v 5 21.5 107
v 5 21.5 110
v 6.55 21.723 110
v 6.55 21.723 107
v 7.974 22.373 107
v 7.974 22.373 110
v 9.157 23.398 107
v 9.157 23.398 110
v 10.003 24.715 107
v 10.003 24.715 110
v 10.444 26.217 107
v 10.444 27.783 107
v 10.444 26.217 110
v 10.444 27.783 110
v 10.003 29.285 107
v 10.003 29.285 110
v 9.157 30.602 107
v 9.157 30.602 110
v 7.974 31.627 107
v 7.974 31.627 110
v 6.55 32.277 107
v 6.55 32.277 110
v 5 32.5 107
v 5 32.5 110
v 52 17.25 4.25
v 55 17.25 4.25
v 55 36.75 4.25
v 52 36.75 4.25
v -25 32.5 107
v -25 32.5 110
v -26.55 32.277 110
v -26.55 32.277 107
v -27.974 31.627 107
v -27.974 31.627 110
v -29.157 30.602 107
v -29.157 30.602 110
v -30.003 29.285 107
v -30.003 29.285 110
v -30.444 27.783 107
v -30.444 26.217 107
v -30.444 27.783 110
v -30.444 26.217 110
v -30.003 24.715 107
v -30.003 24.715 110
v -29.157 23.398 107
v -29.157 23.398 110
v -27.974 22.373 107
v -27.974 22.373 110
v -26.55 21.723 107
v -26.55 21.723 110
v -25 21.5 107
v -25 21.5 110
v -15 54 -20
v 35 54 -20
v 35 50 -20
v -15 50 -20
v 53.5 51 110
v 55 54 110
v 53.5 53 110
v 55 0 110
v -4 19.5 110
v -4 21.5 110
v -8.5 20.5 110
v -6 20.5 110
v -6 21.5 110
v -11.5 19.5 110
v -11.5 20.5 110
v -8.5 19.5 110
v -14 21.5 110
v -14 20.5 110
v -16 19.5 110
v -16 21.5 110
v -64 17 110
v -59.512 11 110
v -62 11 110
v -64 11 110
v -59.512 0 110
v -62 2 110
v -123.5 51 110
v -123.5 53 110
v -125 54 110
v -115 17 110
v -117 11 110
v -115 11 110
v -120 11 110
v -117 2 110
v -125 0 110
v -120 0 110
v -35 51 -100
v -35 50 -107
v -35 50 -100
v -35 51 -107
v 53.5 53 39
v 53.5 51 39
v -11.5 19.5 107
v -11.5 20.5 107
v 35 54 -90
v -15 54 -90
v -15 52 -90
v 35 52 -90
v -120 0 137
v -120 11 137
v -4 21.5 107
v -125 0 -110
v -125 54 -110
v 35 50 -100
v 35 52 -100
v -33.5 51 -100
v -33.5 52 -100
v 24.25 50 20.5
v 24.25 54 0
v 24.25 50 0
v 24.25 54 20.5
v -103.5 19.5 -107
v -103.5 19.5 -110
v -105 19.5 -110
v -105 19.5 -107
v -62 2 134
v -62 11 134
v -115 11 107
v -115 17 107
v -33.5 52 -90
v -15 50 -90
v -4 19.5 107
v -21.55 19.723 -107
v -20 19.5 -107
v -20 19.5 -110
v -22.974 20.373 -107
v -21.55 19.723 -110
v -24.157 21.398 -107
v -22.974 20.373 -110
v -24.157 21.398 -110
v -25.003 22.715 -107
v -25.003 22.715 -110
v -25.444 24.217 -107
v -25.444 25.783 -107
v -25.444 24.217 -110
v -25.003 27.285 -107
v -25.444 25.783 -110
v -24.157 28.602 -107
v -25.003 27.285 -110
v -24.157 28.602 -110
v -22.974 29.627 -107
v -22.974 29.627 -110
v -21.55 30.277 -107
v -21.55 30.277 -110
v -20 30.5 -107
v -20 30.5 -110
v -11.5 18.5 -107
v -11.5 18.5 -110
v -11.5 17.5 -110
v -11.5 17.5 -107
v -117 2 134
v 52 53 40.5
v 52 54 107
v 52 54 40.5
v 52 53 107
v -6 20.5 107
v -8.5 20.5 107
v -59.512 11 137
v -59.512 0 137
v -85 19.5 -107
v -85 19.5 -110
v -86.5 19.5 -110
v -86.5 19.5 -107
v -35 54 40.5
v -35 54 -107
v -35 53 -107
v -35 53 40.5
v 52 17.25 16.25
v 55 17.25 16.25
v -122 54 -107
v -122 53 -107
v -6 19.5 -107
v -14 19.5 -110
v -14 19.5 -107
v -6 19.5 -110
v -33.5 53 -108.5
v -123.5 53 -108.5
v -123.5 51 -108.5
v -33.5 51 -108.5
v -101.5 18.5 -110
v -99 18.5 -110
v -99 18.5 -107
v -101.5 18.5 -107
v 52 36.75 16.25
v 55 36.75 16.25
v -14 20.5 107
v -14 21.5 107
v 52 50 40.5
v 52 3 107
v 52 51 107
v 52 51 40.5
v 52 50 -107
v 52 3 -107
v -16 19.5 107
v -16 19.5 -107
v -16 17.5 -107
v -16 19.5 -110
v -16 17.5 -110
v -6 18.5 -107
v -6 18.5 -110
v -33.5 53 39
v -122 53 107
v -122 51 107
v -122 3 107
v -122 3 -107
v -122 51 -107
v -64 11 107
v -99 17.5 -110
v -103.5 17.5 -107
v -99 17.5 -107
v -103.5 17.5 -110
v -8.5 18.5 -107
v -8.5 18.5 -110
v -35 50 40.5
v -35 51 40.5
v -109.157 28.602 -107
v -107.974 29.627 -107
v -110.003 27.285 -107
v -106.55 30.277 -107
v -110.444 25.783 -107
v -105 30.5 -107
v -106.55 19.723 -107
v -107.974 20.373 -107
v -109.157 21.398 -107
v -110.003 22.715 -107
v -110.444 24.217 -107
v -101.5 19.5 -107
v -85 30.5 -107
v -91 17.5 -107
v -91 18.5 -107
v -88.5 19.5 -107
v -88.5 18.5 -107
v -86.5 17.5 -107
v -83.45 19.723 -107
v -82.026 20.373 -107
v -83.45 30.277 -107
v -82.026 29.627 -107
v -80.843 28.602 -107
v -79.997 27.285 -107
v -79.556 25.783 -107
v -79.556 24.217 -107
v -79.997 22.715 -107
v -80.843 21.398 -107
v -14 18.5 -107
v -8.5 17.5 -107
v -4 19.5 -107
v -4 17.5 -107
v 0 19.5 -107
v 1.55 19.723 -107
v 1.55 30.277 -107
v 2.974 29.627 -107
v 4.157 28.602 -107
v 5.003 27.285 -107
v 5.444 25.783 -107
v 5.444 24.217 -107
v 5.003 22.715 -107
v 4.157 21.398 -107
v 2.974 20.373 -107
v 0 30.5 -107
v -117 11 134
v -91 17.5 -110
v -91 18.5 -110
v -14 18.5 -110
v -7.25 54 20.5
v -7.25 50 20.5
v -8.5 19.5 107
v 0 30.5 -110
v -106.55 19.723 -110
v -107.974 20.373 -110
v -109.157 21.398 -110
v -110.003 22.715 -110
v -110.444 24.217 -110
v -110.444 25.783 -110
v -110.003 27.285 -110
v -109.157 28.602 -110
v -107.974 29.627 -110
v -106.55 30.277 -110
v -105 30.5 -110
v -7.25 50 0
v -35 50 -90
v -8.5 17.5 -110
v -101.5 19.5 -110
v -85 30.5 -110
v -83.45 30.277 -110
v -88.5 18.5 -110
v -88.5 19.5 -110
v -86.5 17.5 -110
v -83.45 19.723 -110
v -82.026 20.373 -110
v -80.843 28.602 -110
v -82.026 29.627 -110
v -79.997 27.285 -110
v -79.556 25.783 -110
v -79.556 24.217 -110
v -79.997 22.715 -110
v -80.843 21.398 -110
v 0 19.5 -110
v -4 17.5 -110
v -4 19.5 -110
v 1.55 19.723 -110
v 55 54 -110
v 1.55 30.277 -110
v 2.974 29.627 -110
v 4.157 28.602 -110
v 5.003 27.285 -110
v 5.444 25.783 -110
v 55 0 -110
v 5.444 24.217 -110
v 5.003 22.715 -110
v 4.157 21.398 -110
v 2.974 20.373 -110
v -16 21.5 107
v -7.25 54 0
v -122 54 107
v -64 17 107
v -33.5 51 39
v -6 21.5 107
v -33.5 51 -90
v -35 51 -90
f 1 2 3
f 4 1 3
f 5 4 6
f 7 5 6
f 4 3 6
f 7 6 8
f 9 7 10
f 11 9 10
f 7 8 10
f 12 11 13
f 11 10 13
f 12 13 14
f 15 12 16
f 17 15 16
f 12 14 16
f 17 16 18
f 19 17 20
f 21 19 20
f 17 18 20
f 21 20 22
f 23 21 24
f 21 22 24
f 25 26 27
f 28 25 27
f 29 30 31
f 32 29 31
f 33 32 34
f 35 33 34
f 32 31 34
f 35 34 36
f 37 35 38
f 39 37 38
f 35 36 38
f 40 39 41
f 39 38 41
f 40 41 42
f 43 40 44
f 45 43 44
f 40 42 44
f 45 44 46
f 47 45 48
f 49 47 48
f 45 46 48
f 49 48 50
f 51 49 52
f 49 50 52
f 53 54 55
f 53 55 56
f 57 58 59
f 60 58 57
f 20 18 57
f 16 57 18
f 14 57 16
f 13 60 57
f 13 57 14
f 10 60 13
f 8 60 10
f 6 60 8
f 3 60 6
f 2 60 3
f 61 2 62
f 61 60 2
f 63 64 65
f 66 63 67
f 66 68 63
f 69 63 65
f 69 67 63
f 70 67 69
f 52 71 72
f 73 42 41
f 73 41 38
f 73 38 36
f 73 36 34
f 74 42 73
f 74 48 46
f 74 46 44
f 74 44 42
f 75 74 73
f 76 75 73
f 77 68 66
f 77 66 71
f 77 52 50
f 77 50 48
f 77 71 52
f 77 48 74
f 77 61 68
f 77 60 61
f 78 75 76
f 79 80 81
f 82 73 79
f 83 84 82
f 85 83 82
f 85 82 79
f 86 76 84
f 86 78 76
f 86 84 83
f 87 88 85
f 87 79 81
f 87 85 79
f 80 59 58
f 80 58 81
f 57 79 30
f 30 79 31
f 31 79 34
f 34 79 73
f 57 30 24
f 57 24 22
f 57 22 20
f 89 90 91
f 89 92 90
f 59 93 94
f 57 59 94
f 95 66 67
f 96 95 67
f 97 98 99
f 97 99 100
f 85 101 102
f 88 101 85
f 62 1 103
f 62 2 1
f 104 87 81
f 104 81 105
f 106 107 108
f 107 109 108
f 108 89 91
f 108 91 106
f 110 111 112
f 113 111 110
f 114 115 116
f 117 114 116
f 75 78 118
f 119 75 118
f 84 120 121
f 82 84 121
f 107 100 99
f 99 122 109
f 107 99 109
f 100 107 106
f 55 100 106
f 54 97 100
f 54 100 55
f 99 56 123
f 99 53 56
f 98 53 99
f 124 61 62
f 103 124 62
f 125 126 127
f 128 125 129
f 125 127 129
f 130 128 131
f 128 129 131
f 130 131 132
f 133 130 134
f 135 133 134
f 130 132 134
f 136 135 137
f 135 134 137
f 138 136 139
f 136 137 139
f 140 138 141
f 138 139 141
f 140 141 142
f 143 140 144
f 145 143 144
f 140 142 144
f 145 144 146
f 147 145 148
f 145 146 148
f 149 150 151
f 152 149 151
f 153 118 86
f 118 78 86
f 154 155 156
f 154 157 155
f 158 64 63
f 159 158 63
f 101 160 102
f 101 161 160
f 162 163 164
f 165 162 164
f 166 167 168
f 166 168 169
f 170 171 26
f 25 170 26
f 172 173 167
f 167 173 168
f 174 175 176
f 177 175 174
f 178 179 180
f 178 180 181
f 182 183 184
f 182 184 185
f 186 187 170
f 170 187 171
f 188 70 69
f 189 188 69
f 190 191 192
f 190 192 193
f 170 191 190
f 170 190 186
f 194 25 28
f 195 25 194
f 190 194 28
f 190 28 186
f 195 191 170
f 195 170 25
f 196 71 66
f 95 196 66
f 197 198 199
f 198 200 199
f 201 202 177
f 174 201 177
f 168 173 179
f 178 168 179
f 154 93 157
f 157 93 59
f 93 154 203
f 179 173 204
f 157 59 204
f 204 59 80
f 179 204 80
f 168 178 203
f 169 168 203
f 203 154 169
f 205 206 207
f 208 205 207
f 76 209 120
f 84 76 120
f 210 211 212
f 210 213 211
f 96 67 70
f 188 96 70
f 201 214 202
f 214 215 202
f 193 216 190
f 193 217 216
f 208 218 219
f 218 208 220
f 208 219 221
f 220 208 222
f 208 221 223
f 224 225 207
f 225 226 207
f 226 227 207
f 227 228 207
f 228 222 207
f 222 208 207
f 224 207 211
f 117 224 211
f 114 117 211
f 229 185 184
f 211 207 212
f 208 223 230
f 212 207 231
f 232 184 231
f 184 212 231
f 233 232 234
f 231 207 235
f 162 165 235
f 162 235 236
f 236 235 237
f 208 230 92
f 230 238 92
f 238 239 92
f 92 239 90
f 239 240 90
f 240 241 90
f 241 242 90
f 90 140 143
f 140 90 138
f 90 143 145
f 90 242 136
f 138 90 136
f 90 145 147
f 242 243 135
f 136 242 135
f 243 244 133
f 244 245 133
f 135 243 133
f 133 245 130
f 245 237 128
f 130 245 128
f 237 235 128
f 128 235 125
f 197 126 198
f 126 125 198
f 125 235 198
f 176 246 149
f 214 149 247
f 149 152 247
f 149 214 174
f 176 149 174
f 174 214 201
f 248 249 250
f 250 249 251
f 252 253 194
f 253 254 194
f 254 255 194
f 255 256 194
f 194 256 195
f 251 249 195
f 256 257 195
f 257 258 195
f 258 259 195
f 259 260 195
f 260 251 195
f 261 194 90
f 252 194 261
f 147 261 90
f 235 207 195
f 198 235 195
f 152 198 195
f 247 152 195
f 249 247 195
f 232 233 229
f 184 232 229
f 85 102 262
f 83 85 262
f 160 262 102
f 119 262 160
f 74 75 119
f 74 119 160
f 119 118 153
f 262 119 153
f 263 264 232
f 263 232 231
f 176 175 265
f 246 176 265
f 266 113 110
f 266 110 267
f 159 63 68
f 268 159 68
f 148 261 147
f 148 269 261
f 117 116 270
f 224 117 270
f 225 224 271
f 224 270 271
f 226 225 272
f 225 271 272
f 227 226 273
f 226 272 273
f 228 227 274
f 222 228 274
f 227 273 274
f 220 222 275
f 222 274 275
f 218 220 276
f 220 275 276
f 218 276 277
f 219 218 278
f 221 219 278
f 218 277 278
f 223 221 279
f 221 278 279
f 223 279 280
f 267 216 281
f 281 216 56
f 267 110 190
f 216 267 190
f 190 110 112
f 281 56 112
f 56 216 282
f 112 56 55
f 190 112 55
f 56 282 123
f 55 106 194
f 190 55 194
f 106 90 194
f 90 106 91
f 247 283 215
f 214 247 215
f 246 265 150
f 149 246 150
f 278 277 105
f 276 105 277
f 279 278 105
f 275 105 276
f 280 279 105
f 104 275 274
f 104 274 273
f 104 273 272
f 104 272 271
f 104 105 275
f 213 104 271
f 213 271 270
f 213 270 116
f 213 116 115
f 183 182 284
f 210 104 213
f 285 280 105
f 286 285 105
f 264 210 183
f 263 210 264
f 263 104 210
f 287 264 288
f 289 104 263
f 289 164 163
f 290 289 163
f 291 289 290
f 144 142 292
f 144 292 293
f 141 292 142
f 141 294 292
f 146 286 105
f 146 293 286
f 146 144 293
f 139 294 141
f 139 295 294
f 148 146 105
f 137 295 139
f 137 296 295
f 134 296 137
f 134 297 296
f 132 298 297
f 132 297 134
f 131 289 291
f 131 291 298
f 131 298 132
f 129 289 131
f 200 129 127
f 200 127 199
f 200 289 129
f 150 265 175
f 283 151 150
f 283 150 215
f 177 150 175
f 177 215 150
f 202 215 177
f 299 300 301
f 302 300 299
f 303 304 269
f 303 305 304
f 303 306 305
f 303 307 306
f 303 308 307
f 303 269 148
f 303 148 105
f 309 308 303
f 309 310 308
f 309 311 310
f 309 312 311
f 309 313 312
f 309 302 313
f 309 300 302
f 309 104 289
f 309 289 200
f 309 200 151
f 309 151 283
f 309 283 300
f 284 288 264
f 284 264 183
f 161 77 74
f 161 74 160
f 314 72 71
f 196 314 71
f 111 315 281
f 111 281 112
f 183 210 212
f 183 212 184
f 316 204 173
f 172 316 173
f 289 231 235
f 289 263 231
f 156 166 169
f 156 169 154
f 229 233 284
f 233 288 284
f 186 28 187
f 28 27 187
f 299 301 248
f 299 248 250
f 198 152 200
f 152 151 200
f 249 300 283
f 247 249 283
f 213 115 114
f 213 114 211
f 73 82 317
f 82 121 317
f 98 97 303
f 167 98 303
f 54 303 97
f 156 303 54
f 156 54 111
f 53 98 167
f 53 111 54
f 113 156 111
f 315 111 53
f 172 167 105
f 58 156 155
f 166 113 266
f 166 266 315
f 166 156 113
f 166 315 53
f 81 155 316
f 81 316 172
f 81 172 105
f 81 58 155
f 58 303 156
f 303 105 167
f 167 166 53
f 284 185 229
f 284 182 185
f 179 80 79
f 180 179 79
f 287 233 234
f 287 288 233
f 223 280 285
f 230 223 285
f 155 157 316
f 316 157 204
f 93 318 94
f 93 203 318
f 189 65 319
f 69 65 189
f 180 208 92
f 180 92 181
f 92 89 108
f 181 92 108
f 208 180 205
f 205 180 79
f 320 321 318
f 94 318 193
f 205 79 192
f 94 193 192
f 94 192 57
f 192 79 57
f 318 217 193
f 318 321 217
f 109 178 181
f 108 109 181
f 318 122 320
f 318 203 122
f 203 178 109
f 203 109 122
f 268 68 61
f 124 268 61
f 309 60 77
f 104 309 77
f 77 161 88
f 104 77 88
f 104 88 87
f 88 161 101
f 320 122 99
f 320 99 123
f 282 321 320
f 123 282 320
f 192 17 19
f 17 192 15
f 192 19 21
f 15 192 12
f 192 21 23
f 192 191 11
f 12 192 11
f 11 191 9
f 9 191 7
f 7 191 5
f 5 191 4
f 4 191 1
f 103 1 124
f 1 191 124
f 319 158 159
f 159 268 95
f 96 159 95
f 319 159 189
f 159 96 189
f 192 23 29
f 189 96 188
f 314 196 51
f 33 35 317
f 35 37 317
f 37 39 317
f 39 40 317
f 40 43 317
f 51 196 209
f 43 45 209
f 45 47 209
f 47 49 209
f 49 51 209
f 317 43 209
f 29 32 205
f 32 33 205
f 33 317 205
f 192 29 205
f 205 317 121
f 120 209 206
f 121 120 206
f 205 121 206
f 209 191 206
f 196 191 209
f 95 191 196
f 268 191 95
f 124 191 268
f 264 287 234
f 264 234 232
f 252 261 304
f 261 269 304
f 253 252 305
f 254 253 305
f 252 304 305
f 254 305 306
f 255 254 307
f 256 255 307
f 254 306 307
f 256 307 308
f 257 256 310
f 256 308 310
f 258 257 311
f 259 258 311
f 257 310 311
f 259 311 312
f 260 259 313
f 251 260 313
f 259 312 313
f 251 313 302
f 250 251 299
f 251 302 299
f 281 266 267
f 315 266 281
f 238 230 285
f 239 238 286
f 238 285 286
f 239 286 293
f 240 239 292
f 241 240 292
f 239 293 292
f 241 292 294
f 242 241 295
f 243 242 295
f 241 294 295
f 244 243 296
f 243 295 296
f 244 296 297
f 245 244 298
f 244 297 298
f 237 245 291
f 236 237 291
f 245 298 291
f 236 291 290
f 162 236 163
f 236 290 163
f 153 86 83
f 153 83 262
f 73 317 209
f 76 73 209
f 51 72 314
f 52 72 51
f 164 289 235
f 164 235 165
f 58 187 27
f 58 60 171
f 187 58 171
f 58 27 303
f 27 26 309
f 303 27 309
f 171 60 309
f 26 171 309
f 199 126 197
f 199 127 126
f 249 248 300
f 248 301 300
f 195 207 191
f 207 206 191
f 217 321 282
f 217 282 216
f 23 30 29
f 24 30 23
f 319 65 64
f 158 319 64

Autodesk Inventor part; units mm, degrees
sketch "Sketch1" plane through (0, 0, 0) normal (0, 1, 0) x (-1, 0, 0)
  line L0 (-122, 107) -> (122, 107)
  line L1 (122, 107) -> (122, -107)
  line L2 (122, -107) -> (-122, -107)
  line L3 (-122, -107) -> (-122, 107)
  line L4 (-122, 107) -> (122, -107) construction
  line L5 (122, 107) -> (-122, -107) construction
  line L6 (-125, 110) -> (125, 110)
  line L7 (125, 110) -> (125, -110)
  line L8 (125, -110) -> (-125, -110)
  line L9 (-125, -110) -> (-125, 110)
  line L10 (-125, 110) -> (125, -110) construction
  line L11 (125, 110) -> (-125, -110) construction
  line L12 (122, 107) -> (-52, 107)
  line L13 (-52, 107) -> (-52, -107)
  line L14 (125, 110) -> (-55, 110)
  line L15 (-55, 110) -> (-55, -110)
  point P0 (0, 0)
  dimension "d0" = 244
  dimension "d1" = 214
  dimension "d2" = 250
  dimension "d3" = 220
  dimension "d111" = 174
  dimension "d112" = 180
extrude "Extrusion1" add sketch "Sketch1" along normal blind 54 contours L0 L15 L6 L7 L8 L2 L1 | L13 L2 L15 L0
sketch "Sketch2" plane through (0, 0, 0) normal (0, -1, 0) x (1, 0, 0)
  line L0 (123.5, 110) -> (-123.5, 110)
  line L1 (-123.5, 110) -> (-123.5, -110)
  line L2 (-123.5, -110) -> (123.5, -110)
  line L3 (123.5, -110) -> (123.5, 110)
  line L4 (123.5, 110) -> (-123.5, -110) construction
  line L5 (-123.5, 110) -> (123.5, -110) construction
  line L6 (55, 110) -> (55, -110) projected
  line L7 (55, 110) -> (55, -110)
  point P0 (0, 0)
  dimension "d6" = 247
  dimension "d7" = 220
extrude "Extrusion2" add sketch "Sketch2" against normal blind 3 contours L6 L2 L1 L0
sketch "Sketch3" plane through (-125, 0, 110) normal (0, 0, 1) x (1, 0, 0)
  line L0 (0, 0) -> (0, 54) projected
  line L1 (0, 27) -> (100, 27)
  circle A0 centre (100, 27) radius 8
  circle A1 centre (100, 27) radius 5.5
  line L2 (100, 35) -> (115, 35)
  line L3 (115, 35) -> (115, 19)
  line L4 (115, 19) -> (100, 19)
  line L5 (100, 19) -> (100, 35)
  line L6 (100, 32.5) -> (115, 32.5)
  line L7 (115, 32.5) -> (115, 21.5)
  line L8 (115, 21.5) -> (100, 21.5)
  line L9 (100, 21.5) -> (100, 32.5)
  line L10 (100, 32.5) -> (109, 32.5)
  line L11 (109, 32.5) -> (109, 34.5)
  line L12 (109, 34.5) -> (113.5, 34.5)
  line L13 (113.5, 34.5) -> (113.5, 33.5)
  line L14 (113.5, 33.5) -> (111, 33.5)
  line L15 (111, 33.5) -> (111, 32.5)
  line L16 (100, 27) -> (115, 27)
  line L17 (109, 21.5) -> (109, 19.5)
  line L18 (109, 19.5) -> (113.5, 19.5)
  line L19 (113.5, 19.5) -> (113.5, 20.5)
  line L20 (113.5, 20.5) -> (111, 20.5)
  line L21 (111, 20.5) -> (111, 21.5)
  point P0 (125, 0)
  dimension "d10" = 100
  dimension "d11" = 16
  dimension "d12" = 11
  dimension "d13" = 15
  dimension "d14" = 9
  dimension "d15" = 2
  dimension "d16" = 4.5
  dimension "d17" = 2.5
extrude "Extrusion3" cut sketch "Sketch3" against normal blind 38 contours A1 L5 L1 | L1 L5 A1 | L16 A1 L5 | L5 A1 L16 | L6 A0 L16 A1 | A1 L16 A0 L8 | L6 L3 L16 A0 | A0 L16 L3 L8 | L8 L21 L20 L19 L18 L17
ref_plane "Work Plane2" through (-10, 21.5, 110) normal (-1, 0, 0) x (0, 0, 1)
mirror "Mirror1" about plane through (-10, 21.5, 110) normal (-1, 0, 0) of "Extrusion3"
sketch "Sketch5" plane through (125, 0, -110) normal (0, 0, -1) x (-1, 0, 0)
  line L0 (250, 6) -> (250, 25)
  line L1 (250, 25) -> (230, 25)
  circle A0 centre (230, 25) radius 8
  circle A1 centre (230, 25) radius 5.5
  line L2 (230, 33) -> (220, 33)
  line L3 (220, 33) -> (220, 17)
  line L4 (220, 17) -> (230, 17)
  line L5 (230, 17) -> (230, 33)
  line L6 (230, 30.5) -> (220, 30.5)
  line L7 (220, 30.5) -> (220, 19.5)
  line L8 (220, 19.5) -> (230, 19.5)
  line L9 (230, 19.5) -> (230, 30.5)
  line L10 (230, 30.5) -> (228.5, 30.5)
  line L11 (228.5, 30.5) -> (228.5, 32.5)
  line L12 (228.5, 32.5) -> (224, 32.5)
  line L13 (224, 32.5) -> (224, 31.5)
  line L14 (224, 31.5) -> (226.5, 31.5)
  line L15 (226.5, 31.5) -> (226.5, 30.5)
  line L16 (230, 25) -> (230, 0)
  line L17 (70, 0) -> (250, 0) projected
  line L18 (250, 0) -> (230, 0)
  line L19 (250, 0) -> (230, 0)
  line L20 (228.5, 19.5) -> (228.5, 17.5)
  line L21 (228.5, 17.5) -> (224, 17.5)
  line L22 (224, 17.5) -> (224, 18.5)
  line L23 (224, 18.5) -> (226.5, 18.5)
  line L24 (226.5, 18.5) -> (226.5, 19.5)
  point P0 (125, 0)
  point P1 (121.8464, -1.1281)
  point P2 (220.8464, 22.8719)
  point P3 (228.3464, 12.8719)
  point P4 (227.2161, 32.5)
  point P5 (225.3363, 31.5)
  point P6 (0, 0)
  point P7 (1.5, 0)
  dimension "d36" = 20
  dimension "d37" = 16
  dimension "d38" = 11
  dimension "d39" = 10
  dimension "d40" = 1.5
  dimension "d41" = 2
  dimension "d42" = 4.5
  dimension "d43" = 2.5
  dimension "d44" = 1
  dimension "d45" = 1
  dimension "d63" = 25
  dimension "d103" = 19
  dimension "d106" = 20
extrude "Extrusion5" cut sketch "Sketch5" against normal blind 10 contours A1 L5 L1 | L1 L5 A1 | L5 A1 | A1 L8 A0 L6 | L21 L22 L23 A0 | A0 L23 L24 L8 L20 L21 | L6 A0 L8 L3
ref_plane "Work Plane4" through (-95, 19.5, -110) normal (-1, 0, 0) x (0, 0, 1)
mirror "Mirror3" about plane through (-95, 19.5, -110) normal (-1, 0, 0) of "Extrusion5"
sketch "Sketch6" plane through (125, 0, -110) normal (0, 0, -1) x (-1, 0, 0)
  circle A0 centre (125, 25) radius 8
  circle A1 centre (125, 25) radius 5.5
  line L0 (125, 33) -> (135, 33)
  line L1 (135, 33) -> (135, 17)
  line L2 (135, 17) -> (125, 17)
  line L3 (125, 30.5) -> (135, 30.5)
  line L4 (135, 19.5) -> (125, 19.5)
  line L5 (125, 30.5) -> (129, 30.5)
  line L6 (129, 30.5) -> (129, 32.5)
  line L7 (129, 32.5) -> (133.5, 32.5)
  line L8 (133.5, 25) -> (133.5, 24.983)
  line L9 (133.5, 31.5) -> (131, 31.5)
  line L10 (131, 31.5) -> (131, 30.5)
  line L11 (116.2614, 18.9998) -> (135.2614, 18.9998) construction
  line L12 (133.5, 32.5) -> (133.5, 31.5)
  line L13 (250, 0) -> (250, 54) projected
  line L14 (250, 0) -> (125, 0)
  line L15 (70, 0) -> (250, 0) projected
  line L16 (125, 25) -> (125, 0)
  line L17 (125, 33) -> (125, 25)
  line L18 (125, 30.5) -> (125, 33)
  line L19 (131, 30.5) -> (131, 31.5)
  line L20 (135, 33) -> (135, 17)
  line L21 (125, 17) -> (135, 17)
  line L22 (125, 25) -> (135, 25)
  line L23 (129, 19.5) -> (129, 17.5)
  line L24 (129, 17.5) -> (133.5, 17.5)
  line L25 (133.5, 18.5) -> (131, 18.5)
  line L26 (131, 18.5) -> (131, 19.5)
  line L27 (133.5, 17.5) -> (133.5, 18.5)
  point P0 (125, 0)
  point P1 (219.2081, 3.6104)
  point P2 (112.7081, 17.6104)
  point P3 (127.7081, 27.6104)
  point P4 (0, 0)
  point P5 (1.5, 0)
  dimension "d50" = 16
  dimension "d51" = 11
  dimension "d54" = 2
  dimension "d55" = 4.5
  dimension "d56" = 2.5
  dimension "d57" = 1.5
  dimension "d104" = 25
  dimension "d105" = 125
extrude "Extrusion6" cut sketch "Sketch6" against normal blind 10 contours L3 A0 L22 A1 | L17 L16 A1 | A1 L22 L17 | L23 L4 A0 | A0 L4 L26 L25 L27 L24 L23 | L16 L22 A1 | A1 L22 A0 L4 | L3 L1 L22 A0 | A0 L22 L1 L4
ref_plane "Work Plane5" through (-10, 19.5, -110) normal (1, 0, 0) x (0, 0, -1)
mirror "Mirror4" about plane through (-10, 19.5, -110) normal (1, 0, 0) of "Extrusion6"
sketch "Sketch7" plane through (122, 50, 107) normal (0, 0, -1) x (-1, 0, 0)
  line L0 (70, -47) -> (244, -47) projected
  line L1 (75.0855, -47) -> (75.0855, -50)
  line L2 (75.0855, -50) -> (75.0855, -47)
  line L3 (0, -47) -> (184, -47)
  line L4 (184, -47) -> (184, -39)
  line L5 (184, -39) -> (239, -39)
  line L6 (239, -39) -> (239, -47)
  line L7 (184, -39) -> (194, -39)
  line L8 (239, -39) -> (229, -39)
  line L9 (194, -34.8824) -> (194, -33)
  line L10 (194, -33) -> (229, -33)
  line L11 (229, -33) -> (229, -34.8824)
  line L12 (244, -47) -> (244, 4) projected
  line L13 (184, -47) -> (211.5, -47)
  line L14 (211.5, -47) -> (211.5, -39)
  line L15 (237, -39) -> (237, -33)
  line L16 (237, -33) -> (186, -33)
  line L17 (186, -33) -> (186, -39)
  line L18 (186, -45) -> (237, -33) construction
  line L19 (237, -45) -> (186, -33) construction
  line L20 (186, -39) -> (237, -39)
  point P0 (122, -50)
  point P1 (244, 4)
  point P2 (239, -43)
  point P3 (2, -35)
  point P4 (245, -35)
  point P5 (247, -38)
  point P6 (186, -39)
  point P7 (237, -39)
  dimension "d65" = 8
  dimension "d66" = 55
  dimension "d67" = 10
  dimension "d68" = 10
  dimension "d69" = 6
  dimension "d89" = 5
  dimension "d90" = 51
extrude "Extrusion7" cut sketch "Sketch7" against normal blind 10 contours L5 L17 L16 L10 L15
sketch "Sketch17" plane through (-125, 0, 110) normal (0, 0, 1) x (1, 0, 0)
  line L0 (10, 11) -> (61, 11) projected
  line L1 (35.5, 11) -> (35.5, 0)
  line L2 (177, 3) -> (3, 3) projected
  line L3 (35.5, -2) -> (63, -2)
  line L4 (63, -2) -> (63, 2)
  line L5 (63, 2) -> (8, 2)
  line L6 (8, 2) -> (8, -2)
  line L7 (8, -2) -> (63, 2) construction
  line L8 (63, -2) -> (8, 2) construction
  line L9 (180, 0) -> (0, 0) projected
  line L10 (8, 0) -> (63, 0)
  point P0 (125, 0)
  point P1 (247, 3)
  point P2 (250, 0)
  point P3 (248.5, 0)
  dimension "d91" = 55
  dimension "d92" = 4
extrude "Extrusion11" add sketch "Sketch17" along normal blind 24
sketch "Sketch18" plane through (-117, 2, 110) normal (0, 1, 0) x (1, 0, 0)
  line L0 (0, 0) -> (0, -24) projected
  line L1 (0, 0) -> (55, 0)
  line L2 (55, 0) -> (55, -24)
  line L3 (55, -24) -> (0, -24)
  line L4 (0, -24) -> (0, 0)
  line L5 (0, 0) -> (-3, 0)
  line L6 (55, 0) -> (58, 0)
  line L7 (-3, 0) -> (57.4885, 0)
  line L8 (57.4885, 0) -> (57.4885, -27)
  line L9 (57.4885, -27) -> (-3, -27)
  line L10 (-3, -27) -> (-3, 0)
  point P0 (117, 110)
  point P1 (57.4885, 0)
  dimension "d95" = 3
  dimension "d96" = 3
  dimension "d97" = 27
extrude "Extrusion12" add sketch "Sketch18" along normal blind 9 and the other way blind 2 contours L0 L3 L2 L6 L8 L9 L10 L5
sketch "Sketch20" plane through (0, 54, 0) normal (0, 1, 0) x (1, 0, 0)
  point P0 (0, 0)
sketch "Sketch21" plane through (0, 54, 0) normal (0, 1, 0) x (1, 0, 0)
  line L0 (55, 110) -> (-125, 110) projected
  line L1 (55, 110) -> (-35, 110)
  line L2 (-35, 110) -> (-35, -40.5)
  line L3 (-35, -40.5) -> (55, -40.5)
  line L4 (55, -40.5) -> (55, 110)
  point P0 (0, 0)
  dimension "d113" = 90
  dimension "d114" = 150.5
extrude "Extrusion14" add sketch "Sketch21" against normal blind 4
sketch "Sketch22" plane through (0, 54, 0) normal (0, 1, 0) x (1, 0, 0)
  line L0 (55, 110) -> (-125, 110) projected
  line L1 (-35, 110) -> (10, 110)
  line L2 (10, 110) -> (10, -40.5)
  line L3 (52, -40.5) -> (-35, -40.5) projected
  line L4 (10, 110) -> (10, 90)
  line L5 (-35, -40.5) -> (-35, 107) projected
  line L6 (-35, 90) -> (-15, 90)
  line L7 (-35, 90) -> (-15, 90) construction
  line L8 (55, -110) -> (55, 110) projected
  line L9 (55, 90) -> (35, 90)
  line L10 (55, 90) -> (75, 90) construction
  line L11 (-15, 90) -> (35, 90)
  line L12 (35, 90) -> (35, 20)
  line L13 (35, 20) -> (-15, 20)
  line L14 (-15, 20) -> (-15, 90)
  point P0 (0, 0)
  dimension "d117" = 45
  dimension "d118" = 20
  dimension "d119" = 20
  dimension "d120" = 0
  dimension "d121" = 20
  dimension "d122" = 180
  dimension "d123" = 70
extrude "Extrusion15" cut sketch "Sketch22" against normal blind 4 contours L11 L12 L13 L2 | L2 L13 L14 L11
sketch "Sketch23" plane through (0, 54, 0) normal (0, 1, 0) x (1, 0, 0)
  line L0 (52, -40.5) -> (-35, -40.5) projected
  line L1 (8.5, -40.5) -> (8.5, 20)
  line L2 (-15, 20) -> (35, 20) projected
  line L3 (-35, -40.5) -> (-35, 107) projected
  line L4 (-35, -10.25) -> (55, -10.25)
  line L5 (-35, -10.25) -> (55, -10.25) construction
  line L6 (24.25, -20.5) -> (-7.25, -20.5)
  line L7 (-7.25, -20.5) -> (-7.25, 0)
  line L8 (-7.25, 0) -> (24.25, 0)
  line L9 (24.25, 0) -> (24.25, -20.5)
  line L10 (24.25, -20.5) -> (-7.25, 0) construction
  line L11 (-7.25, -20.5) -> (24.25, 0) construction
  point P0 (0, 0)
  point P1 (8.5, -10.25)
  dimension "d126" = 90
  dimension "d127" = 0
  dimension "d128" = 31.5
extrude "Extrusion16" cut sketch "Sketch23" against normal blind 4 contours L6 L7 L4 L1 | L1 L4 L9 L6 | L4 L7 L8 L1 | L1 L8 L9 L4
sketch "Sketch24" plane through (55, 0, 110) normal (1, 0, 0) x (0, 0, -1)
  line L0 (99.75, 54.0966) -> (99.75, 0)
  line L1 (217, 3) -> (3, 3) projected
  line L2 (0, 0) -> (0, 54) projected
  line L3 (0, 27) -> (220, 27)
  line L4 (220, 0) -> (220, 54) projected
  line L5 (93.75, 17.25) -> (105.75, 17.25)
  line L6 (105.75, 17.25) -> (105.75, 36.75)
  line L7 (105.75, 36.75) -> (93.75, 36.75)
  line L8 (93.75, 36.75) -> (93.75, 17.25)
  line L9 (93.75, 17.25) -> (105.75, 36.75) construction
  line L10 (105.75, 17.25) -> (93.75, 36.75) construction
  point P0 (110, 0)
  point P1 (99.75, 27)
  dimension "d131" = 12
  dimension "d132" = 19.5
extrude "Extrusion17" cut sketch "Sketch24" against normal blind 4
sketch "Sketch27" plane through (-35, 54, -107) normal (-1, 0, 0) x (0, 0, 1)
  line L0 (17, 0) -> (17, -4) projected
  line L1 (17, -4) -> (7, -4)
  line L2 (147.5, -4) -> (0, -4) projected
  line L3 (7, -4) -> (17, -4)
  line L4 (17, -4) -> (17, -2)
  line L5 (17, -2) -> (7, -2)
  line L6 (7, -2) -> (7, -4)
  point P0 (107, -54)
  dimension "d135" = 10
extrude "Extrusion18" cut sketch "Sketch27" against normal blind 70
sketch "Sketch29" plane through (-125, 54, 110) normal (0, 0, 1) x (1, 0, 0)
  line L0 (3, -51) -> (3, 0) projected
  line L1 (3, 0) -> (3, -1)
  line L2 (3, -1) -> (1.5, -1)
  line L3 (1.5, -1) -> (1.5, -3)
  line L4 (1.5, -3) -> (3, -3)
  line L5 (1.5, -1) -> (178.5, -1)
  line L6 (178.5, -1) -> (178.5, -3)
  line L7 (178.5, -3) -> (1.5, -3)
  line L8 (1.5, -3) -> (1.5, -1)
  line L9 (90, -4) -> (90, 0) projected
  line L10 (90, -1) -> (90, -3)
  line L11 (90, -1) -> (91.5, -1)
  line L12 (91.5, -1) -> (91.5, -3)
  line L13 (90, -3) -> (91.5, -3)
  point P0 (125, -54)
  point P1 (3, -1)
  dimension "d140" = 1
  dimension "d141" = 1.5
  dimension "d142" = 2
  dimension "d143" = 177
  dimension "d144" = 2
  dimension "d147" = 1.5
extrude "Extrusion20" cut sketch "Sketch29" against normal blind 218.5 contours L4 L3 L2 L0 | L0 L5 L9 L7 | L9 L5 L12 L7
sketch "Sketch30" plane through (-125, 54, 110) normal (0, 0, 1) x (1, 0, 0)
  line L0 (91.5, -1) -> (178.5, -1)
  line L1 (178.5, -1) -> (178.5, -3)
  line L2 (178.5, -3) -> (91.5, -3)
  line L3 (91.5, -3) -> (91.5, -1)
  point P0 (125, -54)
  dimension "d148" = 87
  dimension "d149" = 2
extrude "Extrusion21" cut sketch "Sketch30" against normal blind 71
properties part number "Main Case"
